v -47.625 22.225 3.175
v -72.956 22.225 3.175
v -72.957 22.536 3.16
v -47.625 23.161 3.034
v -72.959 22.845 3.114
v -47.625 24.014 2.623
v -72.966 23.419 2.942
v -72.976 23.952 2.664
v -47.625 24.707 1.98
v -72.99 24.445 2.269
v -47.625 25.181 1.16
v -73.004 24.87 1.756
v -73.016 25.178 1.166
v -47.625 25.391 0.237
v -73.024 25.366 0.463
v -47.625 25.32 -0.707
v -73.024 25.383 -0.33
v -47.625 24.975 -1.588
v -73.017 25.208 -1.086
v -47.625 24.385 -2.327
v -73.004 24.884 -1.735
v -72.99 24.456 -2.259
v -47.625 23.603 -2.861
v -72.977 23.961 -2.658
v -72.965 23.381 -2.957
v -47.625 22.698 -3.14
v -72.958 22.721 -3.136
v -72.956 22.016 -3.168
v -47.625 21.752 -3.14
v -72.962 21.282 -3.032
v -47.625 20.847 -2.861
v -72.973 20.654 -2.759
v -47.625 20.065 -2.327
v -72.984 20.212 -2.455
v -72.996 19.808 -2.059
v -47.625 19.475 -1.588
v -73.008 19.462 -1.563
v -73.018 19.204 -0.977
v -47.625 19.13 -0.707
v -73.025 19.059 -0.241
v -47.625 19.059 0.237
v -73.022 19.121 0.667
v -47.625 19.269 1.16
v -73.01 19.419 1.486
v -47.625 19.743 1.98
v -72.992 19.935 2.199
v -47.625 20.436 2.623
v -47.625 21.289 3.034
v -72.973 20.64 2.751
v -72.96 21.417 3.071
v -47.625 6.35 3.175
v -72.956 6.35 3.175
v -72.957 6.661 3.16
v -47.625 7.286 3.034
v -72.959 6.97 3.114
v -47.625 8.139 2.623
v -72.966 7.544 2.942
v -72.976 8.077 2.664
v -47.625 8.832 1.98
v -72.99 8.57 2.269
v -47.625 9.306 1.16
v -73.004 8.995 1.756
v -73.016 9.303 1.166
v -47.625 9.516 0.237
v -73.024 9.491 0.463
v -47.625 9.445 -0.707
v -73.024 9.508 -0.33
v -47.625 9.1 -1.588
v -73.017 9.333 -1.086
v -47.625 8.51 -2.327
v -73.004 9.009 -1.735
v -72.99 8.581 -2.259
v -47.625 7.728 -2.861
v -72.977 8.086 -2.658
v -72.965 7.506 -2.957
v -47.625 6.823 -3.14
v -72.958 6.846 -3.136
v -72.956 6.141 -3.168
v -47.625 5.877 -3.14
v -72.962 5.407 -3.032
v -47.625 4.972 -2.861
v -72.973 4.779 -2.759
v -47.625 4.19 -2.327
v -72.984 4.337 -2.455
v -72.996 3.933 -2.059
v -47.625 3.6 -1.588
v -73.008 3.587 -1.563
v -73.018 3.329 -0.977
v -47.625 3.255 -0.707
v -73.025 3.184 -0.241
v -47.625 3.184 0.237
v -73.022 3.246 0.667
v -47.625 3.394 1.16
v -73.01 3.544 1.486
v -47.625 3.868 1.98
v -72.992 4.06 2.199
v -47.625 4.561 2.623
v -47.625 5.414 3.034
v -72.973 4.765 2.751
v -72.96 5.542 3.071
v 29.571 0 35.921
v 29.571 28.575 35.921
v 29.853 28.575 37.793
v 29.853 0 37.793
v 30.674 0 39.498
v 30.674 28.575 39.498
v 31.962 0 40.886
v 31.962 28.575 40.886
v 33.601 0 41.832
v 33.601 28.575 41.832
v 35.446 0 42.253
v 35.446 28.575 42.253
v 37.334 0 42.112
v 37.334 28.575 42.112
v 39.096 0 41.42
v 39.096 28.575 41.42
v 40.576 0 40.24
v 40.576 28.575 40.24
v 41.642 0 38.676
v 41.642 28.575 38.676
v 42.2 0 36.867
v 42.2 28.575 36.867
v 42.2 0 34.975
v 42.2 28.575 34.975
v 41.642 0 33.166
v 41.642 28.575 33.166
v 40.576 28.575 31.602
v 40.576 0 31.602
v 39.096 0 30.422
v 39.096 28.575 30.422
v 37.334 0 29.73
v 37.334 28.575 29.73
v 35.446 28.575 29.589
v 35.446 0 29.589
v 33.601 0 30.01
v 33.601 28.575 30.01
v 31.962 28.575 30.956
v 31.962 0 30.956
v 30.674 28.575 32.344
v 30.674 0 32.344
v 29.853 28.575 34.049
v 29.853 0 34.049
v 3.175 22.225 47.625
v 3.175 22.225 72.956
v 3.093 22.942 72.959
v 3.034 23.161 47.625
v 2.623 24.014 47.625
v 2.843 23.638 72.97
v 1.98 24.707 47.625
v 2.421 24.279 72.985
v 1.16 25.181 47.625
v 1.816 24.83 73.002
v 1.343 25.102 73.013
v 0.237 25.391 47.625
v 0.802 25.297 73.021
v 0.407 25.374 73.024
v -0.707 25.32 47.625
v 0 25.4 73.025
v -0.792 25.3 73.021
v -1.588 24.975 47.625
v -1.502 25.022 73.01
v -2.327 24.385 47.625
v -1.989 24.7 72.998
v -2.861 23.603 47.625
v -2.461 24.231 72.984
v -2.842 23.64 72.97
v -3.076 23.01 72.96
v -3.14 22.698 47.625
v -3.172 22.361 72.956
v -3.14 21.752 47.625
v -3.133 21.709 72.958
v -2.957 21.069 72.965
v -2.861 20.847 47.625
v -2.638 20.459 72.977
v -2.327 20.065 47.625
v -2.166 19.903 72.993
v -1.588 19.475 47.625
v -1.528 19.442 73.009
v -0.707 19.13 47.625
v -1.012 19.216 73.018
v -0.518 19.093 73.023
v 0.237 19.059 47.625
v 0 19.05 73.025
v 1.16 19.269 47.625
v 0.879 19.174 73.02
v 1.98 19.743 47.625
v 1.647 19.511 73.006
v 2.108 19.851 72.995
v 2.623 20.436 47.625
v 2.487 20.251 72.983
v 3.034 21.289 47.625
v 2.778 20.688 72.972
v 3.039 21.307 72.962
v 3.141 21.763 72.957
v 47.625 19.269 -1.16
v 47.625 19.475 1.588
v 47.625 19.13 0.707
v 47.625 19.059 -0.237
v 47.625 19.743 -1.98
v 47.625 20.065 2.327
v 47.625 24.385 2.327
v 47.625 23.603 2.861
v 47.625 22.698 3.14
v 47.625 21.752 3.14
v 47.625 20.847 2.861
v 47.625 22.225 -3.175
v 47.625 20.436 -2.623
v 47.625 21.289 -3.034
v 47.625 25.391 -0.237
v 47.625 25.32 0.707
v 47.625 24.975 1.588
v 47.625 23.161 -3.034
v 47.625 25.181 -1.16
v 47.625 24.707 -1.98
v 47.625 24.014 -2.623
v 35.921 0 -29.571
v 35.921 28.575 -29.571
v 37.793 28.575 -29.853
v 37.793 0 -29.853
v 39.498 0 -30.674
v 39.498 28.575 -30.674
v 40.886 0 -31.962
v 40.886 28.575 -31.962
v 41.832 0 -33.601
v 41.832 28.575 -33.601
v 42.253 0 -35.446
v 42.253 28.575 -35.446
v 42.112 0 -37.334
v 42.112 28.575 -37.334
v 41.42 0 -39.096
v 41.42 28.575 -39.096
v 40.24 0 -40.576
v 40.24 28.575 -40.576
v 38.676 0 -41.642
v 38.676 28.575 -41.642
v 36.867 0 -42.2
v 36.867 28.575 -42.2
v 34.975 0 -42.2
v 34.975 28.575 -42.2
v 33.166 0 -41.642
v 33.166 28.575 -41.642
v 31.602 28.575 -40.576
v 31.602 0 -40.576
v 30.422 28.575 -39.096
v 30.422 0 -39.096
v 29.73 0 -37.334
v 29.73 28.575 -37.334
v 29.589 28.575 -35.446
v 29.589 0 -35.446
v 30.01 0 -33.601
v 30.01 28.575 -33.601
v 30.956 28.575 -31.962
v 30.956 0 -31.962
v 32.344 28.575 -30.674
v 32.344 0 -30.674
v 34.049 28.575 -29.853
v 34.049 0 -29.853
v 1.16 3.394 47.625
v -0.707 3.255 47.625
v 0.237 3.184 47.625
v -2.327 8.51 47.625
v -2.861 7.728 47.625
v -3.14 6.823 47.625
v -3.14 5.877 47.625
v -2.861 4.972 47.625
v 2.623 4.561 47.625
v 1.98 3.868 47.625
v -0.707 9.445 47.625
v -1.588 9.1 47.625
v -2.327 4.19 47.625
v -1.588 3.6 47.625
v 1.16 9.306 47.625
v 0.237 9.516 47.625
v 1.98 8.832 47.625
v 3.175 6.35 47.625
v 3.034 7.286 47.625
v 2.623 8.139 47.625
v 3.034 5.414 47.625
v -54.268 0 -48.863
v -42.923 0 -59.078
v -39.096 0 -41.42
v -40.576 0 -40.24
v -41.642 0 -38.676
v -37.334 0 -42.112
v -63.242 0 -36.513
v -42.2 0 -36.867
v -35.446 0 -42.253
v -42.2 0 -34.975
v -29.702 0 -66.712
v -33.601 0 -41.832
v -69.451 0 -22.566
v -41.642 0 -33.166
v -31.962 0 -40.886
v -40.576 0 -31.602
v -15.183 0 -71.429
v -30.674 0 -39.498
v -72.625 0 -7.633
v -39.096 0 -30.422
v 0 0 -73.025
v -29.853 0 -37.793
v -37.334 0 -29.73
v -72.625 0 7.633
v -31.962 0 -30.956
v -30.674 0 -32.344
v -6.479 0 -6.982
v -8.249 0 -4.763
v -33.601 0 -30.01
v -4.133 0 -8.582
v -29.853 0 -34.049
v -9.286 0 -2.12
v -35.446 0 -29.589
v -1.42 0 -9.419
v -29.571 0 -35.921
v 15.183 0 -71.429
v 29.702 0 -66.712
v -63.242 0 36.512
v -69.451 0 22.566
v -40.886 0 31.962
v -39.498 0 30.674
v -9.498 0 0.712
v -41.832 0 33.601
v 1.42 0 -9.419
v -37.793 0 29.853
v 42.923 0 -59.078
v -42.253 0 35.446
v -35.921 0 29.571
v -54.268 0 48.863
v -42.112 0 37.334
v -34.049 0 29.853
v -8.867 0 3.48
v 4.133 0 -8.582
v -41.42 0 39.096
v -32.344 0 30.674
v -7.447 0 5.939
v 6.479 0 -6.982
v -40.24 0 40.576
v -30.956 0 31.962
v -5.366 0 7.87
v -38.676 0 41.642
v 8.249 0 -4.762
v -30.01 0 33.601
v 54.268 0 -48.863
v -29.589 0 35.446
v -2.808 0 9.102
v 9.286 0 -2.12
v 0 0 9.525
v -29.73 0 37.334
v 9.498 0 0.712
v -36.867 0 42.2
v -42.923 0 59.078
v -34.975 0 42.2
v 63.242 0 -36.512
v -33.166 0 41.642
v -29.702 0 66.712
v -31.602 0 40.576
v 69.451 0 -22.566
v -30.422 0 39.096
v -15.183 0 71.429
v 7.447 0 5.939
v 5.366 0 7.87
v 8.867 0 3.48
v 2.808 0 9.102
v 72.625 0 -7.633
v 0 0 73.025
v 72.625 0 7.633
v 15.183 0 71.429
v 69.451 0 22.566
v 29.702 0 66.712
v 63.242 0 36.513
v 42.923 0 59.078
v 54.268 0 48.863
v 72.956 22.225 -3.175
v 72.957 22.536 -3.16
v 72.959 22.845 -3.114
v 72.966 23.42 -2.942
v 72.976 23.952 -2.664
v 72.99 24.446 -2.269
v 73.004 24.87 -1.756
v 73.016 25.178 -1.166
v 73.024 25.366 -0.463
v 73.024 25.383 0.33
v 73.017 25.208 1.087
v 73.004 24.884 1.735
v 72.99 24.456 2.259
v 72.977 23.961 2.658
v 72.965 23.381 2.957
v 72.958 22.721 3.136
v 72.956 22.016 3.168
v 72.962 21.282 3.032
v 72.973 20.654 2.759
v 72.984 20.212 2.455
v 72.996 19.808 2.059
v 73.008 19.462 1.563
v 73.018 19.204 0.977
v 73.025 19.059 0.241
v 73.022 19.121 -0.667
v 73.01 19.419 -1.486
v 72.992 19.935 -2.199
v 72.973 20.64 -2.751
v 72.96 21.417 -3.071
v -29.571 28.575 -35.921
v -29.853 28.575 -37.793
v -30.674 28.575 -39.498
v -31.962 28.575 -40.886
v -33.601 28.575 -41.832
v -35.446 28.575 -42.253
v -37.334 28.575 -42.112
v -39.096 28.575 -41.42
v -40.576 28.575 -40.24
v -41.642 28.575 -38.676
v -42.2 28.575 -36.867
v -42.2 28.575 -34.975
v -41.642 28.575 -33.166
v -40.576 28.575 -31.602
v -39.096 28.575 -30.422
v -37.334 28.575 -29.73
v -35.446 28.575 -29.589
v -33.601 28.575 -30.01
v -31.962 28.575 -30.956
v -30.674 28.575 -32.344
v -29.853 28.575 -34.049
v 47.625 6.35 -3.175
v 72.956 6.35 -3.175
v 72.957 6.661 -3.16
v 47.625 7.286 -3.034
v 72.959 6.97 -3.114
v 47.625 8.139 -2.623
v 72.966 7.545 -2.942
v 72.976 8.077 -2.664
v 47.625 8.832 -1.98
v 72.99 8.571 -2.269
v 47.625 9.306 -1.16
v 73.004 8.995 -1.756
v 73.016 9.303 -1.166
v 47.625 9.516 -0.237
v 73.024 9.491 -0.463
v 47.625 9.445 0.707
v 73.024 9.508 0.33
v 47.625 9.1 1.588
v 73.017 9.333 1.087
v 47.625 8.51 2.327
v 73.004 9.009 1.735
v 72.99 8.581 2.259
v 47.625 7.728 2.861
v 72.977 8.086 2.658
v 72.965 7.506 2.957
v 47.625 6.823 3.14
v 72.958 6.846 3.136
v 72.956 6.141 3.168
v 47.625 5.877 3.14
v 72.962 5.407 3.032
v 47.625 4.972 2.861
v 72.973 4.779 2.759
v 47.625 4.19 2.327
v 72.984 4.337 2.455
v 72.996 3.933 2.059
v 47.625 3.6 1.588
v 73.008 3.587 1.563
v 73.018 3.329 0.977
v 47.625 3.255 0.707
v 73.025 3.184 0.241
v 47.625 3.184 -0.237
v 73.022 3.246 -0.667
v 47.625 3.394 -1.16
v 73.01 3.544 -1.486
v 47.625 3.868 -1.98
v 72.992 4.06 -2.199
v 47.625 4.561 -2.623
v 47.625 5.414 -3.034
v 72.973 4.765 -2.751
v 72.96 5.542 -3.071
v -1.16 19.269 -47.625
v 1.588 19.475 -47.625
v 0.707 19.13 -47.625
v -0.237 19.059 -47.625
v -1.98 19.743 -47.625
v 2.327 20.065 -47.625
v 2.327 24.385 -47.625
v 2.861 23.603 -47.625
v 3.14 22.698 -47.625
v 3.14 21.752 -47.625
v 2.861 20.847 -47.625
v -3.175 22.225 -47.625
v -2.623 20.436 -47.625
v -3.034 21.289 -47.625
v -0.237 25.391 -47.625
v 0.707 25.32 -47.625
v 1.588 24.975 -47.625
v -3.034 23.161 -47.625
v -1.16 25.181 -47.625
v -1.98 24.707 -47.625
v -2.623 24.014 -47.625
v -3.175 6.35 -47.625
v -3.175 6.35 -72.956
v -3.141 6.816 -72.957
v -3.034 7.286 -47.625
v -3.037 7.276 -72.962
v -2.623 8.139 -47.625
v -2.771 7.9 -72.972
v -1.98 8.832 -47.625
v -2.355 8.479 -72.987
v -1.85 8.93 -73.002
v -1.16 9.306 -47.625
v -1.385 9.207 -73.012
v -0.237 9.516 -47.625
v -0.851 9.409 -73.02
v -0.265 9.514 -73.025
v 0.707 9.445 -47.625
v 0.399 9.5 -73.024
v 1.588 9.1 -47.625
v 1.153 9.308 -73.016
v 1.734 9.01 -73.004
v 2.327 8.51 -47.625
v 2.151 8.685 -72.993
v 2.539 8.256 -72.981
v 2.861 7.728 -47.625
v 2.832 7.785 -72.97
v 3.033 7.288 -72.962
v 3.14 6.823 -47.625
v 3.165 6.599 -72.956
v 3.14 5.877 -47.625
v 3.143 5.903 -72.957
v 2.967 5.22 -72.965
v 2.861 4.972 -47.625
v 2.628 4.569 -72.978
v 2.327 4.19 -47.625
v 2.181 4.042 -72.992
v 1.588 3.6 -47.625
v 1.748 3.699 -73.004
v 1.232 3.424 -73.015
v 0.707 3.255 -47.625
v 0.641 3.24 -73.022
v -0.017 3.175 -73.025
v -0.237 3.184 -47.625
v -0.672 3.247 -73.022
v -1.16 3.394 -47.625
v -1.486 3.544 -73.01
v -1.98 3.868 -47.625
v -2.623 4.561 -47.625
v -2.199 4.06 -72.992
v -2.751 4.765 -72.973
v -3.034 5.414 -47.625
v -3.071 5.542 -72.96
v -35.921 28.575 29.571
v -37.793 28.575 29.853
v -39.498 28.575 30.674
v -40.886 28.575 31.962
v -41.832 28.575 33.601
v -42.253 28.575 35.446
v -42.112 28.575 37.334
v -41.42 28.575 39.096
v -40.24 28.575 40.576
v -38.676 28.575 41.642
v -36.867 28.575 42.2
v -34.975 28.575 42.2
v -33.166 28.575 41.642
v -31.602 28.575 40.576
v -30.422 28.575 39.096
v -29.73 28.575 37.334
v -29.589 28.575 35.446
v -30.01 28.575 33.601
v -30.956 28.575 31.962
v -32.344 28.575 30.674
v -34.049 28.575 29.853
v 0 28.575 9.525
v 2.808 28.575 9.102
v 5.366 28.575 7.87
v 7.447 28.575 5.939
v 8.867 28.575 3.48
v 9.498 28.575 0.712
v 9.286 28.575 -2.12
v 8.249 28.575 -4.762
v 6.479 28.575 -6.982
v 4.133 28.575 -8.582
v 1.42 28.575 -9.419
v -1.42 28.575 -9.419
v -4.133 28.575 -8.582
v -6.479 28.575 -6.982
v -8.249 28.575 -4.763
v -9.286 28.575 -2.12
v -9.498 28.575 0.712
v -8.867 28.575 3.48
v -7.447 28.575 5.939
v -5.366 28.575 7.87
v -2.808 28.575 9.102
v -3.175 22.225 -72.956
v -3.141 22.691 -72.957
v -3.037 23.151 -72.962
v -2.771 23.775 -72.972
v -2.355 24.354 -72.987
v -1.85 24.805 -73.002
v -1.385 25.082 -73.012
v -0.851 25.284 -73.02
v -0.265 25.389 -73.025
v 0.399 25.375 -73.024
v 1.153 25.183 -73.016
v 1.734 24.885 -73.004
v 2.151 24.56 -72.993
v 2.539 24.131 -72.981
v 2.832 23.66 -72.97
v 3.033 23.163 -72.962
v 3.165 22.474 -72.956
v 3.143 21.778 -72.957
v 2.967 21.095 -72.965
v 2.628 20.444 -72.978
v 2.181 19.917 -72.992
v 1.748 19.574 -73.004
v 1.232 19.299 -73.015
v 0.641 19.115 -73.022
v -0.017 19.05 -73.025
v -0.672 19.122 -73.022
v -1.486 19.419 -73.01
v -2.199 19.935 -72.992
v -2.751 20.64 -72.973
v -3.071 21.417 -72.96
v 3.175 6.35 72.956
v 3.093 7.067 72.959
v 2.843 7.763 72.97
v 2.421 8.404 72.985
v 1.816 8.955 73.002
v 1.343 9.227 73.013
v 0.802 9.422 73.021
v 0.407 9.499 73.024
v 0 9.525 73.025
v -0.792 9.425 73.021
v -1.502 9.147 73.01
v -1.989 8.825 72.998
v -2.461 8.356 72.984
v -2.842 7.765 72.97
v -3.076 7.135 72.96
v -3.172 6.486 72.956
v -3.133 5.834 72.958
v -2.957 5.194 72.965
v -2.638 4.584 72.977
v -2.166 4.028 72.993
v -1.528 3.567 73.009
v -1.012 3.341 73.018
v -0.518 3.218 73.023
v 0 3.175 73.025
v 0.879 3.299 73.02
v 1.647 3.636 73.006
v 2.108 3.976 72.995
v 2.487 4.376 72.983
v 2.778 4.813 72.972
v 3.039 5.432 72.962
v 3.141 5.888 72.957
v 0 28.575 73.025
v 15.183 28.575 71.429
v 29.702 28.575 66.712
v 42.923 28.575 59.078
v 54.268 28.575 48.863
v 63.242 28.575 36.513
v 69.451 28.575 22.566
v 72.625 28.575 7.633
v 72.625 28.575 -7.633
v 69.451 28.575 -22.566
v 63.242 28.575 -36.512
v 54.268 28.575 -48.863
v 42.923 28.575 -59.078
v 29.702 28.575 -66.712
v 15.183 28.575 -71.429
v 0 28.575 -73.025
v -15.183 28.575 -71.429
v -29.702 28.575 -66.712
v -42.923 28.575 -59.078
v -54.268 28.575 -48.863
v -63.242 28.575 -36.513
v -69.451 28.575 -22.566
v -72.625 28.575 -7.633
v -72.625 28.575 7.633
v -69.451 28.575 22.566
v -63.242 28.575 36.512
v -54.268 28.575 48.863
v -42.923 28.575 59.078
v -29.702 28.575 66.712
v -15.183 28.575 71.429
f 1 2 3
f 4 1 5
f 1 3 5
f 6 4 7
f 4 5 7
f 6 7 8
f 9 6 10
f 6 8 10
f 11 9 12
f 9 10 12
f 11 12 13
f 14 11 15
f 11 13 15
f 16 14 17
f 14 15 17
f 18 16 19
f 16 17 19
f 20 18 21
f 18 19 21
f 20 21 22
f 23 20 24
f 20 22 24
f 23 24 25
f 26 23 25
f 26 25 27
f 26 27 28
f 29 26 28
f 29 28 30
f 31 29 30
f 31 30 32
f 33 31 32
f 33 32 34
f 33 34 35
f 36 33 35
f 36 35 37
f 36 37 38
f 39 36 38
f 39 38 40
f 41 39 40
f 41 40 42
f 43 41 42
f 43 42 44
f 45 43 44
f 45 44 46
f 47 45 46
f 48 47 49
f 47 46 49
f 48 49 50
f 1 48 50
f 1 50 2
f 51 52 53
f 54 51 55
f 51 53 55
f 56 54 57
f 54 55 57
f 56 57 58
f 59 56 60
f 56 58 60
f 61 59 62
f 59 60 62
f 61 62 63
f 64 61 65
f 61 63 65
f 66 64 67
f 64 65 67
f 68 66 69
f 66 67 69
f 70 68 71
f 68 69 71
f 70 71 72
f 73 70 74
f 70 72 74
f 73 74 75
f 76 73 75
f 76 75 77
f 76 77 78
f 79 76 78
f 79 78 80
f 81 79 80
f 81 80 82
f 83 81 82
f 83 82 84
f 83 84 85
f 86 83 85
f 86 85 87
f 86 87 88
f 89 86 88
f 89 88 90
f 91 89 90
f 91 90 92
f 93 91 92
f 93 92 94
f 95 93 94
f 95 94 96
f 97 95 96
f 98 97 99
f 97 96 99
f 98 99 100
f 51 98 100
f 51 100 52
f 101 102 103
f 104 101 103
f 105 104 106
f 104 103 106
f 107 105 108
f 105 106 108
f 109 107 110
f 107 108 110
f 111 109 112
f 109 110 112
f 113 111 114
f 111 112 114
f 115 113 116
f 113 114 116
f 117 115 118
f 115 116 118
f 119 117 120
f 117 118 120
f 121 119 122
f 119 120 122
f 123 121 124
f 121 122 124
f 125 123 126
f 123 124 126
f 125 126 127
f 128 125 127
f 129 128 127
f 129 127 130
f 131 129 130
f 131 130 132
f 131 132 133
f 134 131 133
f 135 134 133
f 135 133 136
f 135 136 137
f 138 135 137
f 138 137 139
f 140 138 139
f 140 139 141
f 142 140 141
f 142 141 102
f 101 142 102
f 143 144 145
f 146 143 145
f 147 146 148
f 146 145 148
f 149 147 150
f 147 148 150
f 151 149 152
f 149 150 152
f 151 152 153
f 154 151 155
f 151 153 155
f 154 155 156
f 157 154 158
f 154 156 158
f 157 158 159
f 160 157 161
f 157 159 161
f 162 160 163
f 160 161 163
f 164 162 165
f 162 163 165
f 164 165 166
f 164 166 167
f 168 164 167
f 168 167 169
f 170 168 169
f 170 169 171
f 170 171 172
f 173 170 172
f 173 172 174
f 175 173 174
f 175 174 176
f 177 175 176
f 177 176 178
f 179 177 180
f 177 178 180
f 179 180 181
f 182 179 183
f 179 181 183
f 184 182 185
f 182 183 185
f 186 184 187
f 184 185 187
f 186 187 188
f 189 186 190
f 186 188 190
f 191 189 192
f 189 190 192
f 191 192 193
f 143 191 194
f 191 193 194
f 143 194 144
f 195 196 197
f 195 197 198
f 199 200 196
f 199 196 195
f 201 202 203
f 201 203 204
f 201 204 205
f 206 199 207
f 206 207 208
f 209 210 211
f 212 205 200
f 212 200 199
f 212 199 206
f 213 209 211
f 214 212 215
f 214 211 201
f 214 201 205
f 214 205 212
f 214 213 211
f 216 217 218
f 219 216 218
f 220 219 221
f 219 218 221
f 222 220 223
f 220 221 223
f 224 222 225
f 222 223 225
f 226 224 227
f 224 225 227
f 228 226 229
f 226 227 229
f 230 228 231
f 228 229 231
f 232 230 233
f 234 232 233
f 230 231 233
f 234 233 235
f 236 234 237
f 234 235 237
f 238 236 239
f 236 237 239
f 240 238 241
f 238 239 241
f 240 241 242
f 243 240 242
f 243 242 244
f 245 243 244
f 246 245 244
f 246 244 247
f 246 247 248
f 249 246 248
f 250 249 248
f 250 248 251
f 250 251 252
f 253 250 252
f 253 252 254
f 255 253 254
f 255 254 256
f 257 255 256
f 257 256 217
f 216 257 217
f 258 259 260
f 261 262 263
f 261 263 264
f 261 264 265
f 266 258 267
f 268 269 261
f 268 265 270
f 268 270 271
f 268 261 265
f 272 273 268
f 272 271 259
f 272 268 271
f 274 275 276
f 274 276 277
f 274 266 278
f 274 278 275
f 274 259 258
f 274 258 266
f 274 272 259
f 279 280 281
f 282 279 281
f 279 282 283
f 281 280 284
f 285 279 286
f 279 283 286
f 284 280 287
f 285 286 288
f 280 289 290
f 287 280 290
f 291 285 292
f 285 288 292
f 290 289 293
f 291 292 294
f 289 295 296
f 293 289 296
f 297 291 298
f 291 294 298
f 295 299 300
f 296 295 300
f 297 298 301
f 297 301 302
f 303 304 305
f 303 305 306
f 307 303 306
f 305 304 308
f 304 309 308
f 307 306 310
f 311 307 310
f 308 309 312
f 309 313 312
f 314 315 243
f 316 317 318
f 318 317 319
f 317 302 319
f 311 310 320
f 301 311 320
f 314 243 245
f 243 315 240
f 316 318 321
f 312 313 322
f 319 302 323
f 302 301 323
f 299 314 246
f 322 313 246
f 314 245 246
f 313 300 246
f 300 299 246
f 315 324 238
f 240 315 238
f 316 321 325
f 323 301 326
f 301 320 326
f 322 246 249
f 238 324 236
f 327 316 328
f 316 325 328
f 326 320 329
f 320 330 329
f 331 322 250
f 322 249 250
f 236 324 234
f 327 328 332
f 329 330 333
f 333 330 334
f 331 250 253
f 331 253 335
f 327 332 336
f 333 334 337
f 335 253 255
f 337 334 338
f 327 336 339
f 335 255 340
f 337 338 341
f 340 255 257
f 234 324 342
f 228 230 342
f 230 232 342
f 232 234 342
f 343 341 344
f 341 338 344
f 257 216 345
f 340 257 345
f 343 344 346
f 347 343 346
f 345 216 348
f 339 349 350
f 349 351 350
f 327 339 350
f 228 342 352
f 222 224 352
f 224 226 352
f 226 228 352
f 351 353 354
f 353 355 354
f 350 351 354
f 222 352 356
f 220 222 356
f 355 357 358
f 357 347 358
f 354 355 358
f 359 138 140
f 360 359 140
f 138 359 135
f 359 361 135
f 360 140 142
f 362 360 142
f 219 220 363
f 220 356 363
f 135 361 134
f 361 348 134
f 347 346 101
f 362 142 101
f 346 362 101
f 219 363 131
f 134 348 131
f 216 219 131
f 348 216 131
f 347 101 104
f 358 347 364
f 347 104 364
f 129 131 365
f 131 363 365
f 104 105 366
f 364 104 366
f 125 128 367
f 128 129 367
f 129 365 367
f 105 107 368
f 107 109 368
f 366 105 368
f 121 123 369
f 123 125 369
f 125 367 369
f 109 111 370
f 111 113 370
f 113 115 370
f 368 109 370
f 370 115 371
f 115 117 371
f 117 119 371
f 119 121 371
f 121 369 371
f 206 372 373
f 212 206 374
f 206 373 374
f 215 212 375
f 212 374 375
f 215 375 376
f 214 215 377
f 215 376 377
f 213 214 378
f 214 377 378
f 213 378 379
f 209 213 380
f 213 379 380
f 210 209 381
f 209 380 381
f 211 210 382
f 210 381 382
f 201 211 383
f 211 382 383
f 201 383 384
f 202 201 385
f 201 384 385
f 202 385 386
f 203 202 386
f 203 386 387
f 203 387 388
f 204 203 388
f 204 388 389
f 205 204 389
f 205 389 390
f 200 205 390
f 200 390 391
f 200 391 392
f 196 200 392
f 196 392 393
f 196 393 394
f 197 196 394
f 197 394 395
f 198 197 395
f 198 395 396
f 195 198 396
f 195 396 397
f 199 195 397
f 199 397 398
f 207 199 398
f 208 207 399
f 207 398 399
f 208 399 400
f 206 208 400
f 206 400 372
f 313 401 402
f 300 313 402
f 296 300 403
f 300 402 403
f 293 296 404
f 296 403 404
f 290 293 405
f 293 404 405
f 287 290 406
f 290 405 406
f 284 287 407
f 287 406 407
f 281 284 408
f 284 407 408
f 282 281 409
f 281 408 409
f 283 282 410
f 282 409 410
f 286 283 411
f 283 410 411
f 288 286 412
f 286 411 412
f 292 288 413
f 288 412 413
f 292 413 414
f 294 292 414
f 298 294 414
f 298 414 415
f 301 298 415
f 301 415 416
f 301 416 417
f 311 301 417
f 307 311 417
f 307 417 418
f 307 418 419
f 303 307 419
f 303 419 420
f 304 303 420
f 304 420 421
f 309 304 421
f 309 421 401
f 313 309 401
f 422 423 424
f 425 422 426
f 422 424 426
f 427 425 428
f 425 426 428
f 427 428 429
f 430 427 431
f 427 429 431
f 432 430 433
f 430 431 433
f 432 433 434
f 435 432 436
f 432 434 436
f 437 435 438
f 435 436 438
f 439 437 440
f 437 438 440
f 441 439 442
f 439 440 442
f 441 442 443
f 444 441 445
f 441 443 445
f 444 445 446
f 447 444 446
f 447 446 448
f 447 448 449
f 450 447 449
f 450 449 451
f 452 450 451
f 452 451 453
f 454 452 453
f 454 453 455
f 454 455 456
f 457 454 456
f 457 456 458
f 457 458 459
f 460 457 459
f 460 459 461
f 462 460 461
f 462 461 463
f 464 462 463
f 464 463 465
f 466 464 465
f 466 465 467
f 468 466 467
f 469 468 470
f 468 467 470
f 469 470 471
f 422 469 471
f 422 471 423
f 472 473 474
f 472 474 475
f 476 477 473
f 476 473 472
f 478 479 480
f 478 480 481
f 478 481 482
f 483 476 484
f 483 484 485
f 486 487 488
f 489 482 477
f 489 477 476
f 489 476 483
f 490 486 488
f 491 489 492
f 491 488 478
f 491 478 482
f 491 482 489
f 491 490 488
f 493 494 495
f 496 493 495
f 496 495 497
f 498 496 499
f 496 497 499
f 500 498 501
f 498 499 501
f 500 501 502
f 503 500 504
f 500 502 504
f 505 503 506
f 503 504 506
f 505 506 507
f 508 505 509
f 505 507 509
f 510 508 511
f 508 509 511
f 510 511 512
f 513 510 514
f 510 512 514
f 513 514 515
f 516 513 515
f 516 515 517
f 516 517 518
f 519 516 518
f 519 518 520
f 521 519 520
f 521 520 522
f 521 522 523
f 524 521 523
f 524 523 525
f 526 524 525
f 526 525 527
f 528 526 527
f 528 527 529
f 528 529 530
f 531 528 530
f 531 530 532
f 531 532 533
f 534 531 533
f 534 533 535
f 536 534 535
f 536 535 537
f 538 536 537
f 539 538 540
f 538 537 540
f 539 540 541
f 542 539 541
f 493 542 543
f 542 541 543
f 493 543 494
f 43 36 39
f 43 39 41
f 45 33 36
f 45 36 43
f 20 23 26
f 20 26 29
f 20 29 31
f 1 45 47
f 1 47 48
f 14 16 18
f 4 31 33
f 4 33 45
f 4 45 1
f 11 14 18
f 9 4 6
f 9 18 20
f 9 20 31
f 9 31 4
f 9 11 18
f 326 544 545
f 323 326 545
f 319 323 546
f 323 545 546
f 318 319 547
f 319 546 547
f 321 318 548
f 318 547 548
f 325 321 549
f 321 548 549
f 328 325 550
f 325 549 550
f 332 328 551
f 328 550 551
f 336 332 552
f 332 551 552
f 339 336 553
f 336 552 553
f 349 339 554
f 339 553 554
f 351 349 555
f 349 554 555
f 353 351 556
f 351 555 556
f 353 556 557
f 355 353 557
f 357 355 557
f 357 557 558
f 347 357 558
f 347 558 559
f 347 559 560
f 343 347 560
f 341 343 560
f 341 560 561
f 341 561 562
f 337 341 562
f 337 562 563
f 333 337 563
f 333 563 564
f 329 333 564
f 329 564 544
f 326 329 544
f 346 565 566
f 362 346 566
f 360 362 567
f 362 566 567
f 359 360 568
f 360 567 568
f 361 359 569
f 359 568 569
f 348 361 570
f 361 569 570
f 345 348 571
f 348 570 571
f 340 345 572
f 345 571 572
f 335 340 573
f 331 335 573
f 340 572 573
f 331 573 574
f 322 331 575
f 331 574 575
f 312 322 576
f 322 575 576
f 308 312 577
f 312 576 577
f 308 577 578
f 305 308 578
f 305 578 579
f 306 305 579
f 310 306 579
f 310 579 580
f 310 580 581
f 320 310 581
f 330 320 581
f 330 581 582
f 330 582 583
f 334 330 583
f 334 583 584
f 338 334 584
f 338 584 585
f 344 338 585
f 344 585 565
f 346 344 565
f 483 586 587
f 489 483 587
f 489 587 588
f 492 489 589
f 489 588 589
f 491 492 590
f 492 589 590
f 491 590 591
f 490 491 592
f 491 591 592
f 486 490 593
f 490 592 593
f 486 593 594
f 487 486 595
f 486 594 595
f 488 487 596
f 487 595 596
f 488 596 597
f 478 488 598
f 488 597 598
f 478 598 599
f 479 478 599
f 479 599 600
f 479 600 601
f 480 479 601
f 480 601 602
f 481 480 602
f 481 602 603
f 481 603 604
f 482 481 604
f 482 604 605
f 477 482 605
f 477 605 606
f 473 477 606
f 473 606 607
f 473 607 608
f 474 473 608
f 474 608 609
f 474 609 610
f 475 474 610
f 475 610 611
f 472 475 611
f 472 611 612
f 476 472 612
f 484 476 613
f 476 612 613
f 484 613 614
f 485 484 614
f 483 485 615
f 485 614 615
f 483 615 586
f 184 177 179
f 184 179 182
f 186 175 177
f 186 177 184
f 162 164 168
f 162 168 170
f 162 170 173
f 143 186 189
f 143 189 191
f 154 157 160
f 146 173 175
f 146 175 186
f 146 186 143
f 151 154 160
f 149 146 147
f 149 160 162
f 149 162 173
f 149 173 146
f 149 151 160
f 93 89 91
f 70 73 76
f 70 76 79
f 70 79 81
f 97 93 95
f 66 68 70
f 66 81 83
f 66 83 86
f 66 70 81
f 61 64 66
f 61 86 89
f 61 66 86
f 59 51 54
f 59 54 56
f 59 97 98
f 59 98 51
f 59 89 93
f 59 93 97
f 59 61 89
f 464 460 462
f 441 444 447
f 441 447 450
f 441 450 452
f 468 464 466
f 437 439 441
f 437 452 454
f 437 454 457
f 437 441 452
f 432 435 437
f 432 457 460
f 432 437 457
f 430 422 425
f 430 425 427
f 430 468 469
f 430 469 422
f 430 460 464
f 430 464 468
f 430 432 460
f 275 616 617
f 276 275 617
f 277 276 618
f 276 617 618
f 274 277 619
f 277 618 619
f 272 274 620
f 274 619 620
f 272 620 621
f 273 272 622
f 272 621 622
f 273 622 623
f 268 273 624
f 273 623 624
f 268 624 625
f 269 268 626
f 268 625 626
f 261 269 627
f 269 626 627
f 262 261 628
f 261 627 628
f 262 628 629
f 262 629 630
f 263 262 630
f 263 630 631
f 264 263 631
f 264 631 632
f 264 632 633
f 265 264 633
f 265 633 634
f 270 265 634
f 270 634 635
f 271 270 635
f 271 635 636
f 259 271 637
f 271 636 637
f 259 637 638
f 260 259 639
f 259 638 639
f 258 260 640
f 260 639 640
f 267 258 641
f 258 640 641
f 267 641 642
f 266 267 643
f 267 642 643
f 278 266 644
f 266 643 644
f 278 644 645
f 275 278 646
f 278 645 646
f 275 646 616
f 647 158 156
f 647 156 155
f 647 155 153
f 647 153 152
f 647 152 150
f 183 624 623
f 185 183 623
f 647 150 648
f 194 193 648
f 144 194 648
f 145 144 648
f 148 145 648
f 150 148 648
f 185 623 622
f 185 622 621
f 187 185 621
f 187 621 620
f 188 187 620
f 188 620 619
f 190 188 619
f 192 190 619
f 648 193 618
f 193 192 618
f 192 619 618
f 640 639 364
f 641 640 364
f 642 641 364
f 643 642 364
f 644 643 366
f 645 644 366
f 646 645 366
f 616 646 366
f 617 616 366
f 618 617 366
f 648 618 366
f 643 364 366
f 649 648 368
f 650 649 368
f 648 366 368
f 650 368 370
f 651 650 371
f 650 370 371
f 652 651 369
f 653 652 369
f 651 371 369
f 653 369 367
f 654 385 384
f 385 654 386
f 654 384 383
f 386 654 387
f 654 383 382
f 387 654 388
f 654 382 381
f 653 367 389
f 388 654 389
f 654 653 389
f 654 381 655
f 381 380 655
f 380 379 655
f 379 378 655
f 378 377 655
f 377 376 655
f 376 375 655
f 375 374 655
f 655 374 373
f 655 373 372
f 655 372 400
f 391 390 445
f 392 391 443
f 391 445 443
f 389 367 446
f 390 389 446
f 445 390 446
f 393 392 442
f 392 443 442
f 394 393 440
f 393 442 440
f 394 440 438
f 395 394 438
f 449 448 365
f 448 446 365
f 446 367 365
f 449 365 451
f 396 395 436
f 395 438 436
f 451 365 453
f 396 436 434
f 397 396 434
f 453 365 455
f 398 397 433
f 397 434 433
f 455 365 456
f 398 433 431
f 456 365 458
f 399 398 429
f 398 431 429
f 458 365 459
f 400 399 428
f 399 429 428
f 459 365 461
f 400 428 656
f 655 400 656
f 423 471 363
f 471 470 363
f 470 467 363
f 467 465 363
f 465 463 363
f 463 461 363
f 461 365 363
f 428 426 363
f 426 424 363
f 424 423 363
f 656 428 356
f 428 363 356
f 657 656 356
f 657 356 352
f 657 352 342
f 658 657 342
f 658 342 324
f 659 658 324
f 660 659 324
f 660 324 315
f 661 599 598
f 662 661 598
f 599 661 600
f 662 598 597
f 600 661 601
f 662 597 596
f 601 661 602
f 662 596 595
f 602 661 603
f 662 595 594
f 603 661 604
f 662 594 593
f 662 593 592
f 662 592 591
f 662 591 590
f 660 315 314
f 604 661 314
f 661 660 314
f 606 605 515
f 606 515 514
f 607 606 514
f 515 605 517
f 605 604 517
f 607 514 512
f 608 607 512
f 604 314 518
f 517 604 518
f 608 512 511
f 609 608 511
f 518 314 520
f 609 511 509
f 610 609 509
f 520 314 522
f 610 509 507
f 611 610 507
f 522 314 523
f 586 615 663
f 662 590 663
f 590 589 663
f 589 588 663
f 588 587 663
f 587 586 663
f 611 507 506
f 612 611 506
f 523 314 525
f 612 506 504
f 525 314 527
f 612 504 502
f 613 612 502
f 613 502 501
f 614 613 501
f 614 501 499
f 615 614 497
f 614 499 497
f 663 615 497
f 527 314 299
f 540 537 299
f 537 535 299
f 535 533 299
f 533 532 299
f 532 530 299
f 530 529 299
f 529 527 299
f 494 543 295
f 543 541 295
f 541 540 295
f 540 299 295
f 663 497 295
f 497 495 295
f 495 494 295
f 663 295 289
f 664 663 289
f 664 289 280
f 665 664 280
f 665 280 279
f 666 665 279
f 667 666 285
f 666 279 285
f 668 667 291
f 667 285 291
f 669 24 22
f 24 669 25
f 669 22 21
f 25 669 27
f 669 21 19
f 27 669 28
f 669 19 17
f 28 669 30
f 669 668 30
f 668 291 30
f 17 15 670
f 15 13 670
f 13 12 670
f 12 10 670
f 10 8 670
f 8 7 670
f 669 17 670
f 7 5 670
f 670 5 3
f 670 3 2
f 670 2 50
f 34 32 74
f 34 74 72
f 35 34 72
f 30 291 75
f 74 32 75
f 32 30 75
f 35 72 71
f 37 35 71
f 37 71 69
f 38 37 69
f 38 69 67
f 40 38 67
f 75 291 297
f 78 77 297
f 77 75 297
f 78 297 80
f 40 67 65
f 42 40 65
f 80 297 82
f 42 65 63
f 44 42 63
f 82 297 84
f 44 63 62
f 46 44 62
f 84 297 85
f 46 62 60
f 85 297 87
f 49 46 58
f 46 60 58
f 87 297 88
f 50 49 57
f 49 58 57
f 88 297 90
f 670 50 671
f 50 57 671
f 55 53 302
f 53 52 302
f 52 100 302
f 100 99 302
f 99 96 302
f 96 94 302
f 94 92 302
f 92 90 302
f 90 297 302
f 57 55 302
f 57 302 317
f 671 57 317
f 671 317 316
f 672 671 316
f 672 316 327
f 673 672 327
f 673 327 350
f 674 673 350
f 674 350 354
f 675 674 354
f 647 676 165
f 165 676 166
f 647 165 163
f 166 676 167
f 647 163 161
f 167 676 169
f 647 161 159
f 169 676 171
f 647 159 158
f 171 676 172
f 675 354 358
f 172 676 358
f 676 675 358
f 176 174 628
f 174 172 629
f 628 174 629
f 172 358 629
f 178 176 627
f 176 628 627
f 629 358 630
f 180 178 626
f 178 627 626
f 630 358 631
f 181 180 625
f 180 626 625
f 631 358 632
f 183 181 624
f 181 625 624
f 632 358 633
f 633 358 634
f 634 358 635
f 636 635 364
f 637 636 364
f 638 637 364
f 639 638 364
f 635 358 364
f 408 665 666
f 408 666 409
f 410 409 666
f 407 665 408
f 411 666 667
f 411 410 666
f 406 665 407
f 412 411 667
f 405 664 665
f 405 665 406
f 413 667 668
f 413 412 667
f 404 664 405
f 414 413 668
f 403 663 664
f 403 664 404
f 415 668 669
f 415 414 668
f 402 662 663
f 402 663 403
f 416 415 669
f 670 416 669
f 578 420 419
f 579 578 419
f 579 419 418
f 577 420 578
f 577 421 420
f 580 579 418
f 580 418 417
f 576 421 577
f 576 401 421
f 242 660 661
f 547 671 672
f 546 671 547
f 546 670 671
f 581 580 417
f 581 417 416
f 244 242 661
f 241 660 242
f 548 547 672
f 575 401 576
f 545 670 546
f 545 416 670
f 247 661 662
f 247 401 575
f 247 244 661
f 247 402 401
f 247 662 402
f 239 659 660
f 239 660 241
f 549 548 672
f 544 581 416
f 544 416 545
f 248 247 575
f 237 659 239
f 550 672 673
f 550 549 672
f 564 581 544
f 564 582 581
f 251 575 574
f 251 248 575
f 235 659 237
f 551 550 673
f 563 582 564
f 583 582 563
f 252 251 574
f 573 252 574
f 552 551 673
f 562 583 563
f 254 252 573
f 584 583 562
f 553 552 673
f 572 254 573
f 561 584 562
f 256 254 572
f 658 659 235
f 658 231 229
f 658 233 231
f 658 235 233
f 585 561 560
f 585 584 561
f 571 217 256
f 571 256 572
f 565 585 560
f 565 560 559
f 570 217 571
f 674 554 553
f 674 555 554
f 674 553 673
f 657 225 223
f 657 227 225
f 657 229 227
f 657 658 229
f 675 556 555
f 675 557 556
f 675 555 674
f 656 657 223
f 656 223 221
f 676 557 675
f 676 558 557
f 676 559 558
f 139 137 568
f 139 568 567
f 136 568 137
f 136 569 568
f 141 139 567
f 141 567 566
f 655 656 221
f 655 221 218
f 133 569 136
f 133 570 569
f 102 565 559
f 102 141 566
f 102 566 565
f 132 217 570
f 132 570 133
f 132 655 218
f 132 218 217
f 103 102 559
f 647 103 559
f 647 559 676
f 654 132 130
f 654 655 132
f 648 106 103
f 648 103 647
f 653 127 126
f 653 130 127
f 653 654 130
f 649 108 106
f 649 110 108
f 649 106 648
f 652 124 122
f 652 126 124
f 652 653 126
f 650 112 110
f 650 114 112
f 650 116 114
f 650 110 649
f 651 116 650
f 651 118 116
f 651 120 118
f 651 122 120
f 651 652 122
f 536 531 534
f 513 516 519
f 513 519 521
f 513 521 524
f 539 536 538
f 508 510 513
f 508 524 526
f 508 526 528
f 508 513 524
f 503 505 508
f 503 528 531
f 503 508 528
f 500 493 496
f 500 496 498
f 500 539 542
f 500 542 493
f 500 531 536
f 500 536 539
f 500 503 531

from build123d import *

# Parameters (mm, degrees)
SKETCH1_R           = 73.025
BOSS_EXTRUDE1_DEPTH = 28.575
SKETCH2_R           = 9.525
CUT_EXTRUDE1_DEPTH  = 108.153310145
SKETCH30_R          = 3.175
CUT_EXTRUDE2_DEPTH  = 25.4
CIRPATTERN3_COUNT   = 4
SKETCH31_R          = 6.35
CUT_EXTRUDE3_DEPTH  = 108.153310308
CIRPATTERN4_COUNT   = 4


with BuildPart() as part:
    # Sketch1 → Boss-Extrude1 (new body)
    with BuildSketch(Plane(origin=(0, 0, 0), x_dir=(1, 0, 0), z_dir=(0, 1, 0))):
        with Locations(Location((0, 0, 0), (0, 0, 270))):
            Circle(SKETCH1_R)
    extrude(amount=BOSS_EXTRUDE1_DEPTH)

    # Sketch2 → Cut-Extrude1 (cut, through all)
    with BuildSketch(Plane(origin=(0, 28.575, 0), x_dir=(1, 0, 0), z_dir=(0, 1, 0))):
        with Locations(Location((0, 0, 0), (0, 0, 270))):
            Circle(SKETCH2_R)
    extrude(amount=-CUT_EXTRUDE1_DEPTH, mode=Mode.SUBTRACT)

    # Sketch30 → Cut-Extrude2 (cut)
    with BuildSketch(Plane.XY.offset(73.025)):
        with Locations((0, 22.225)):
            Circle(SKETCH30_R)
        with Locations((0, 6.35)):
            Circle(SKETCH30_R)
    cut_extrude2 = extrude(amount=-CUT_EXTRUDE2_DEPTH, mode=Mode.SUBTRACT)

    # CirPattern3: Cut-Extrude2 ×4 about axis
    cirpattern3_axis = Axis((0, 0, 0), (0, 1, 0))
    for i in range(1, CIRPATTERN3_COUNT):
        add(cut_extrude2.rotate(cirpattern3_axis, i * 360 / CIRPATTERN3_COUNT), mode=Mode.SUBTRACT)

    # Sketch31 → Cut-Extrude3 (cut, through all)
    with BuildSketch(Plane(origin=(0, 28.575, 0), x_dir=(1, 0, 0), z_dir=(0, 1, 0))):
        with Locations(Location((35.921024484, 35.921024484, 0), (0, 0, 270))):
            Circle(SKETCH31_R)
    cut_extrude3 = extrude(amount=-CUT_EXTRUDE3_DEPTH, mode=Mode.SUBTRACT)

    # CirPattern4: Cut-Extrude3 ×4 about axis
    cirpattern4_axis = Axis((0, 0, 0), (0, 1, 0))
    for i in range(1, CIRPATTERN4_COUNT):
        add(cut_extrude3.rotate(cirpattern4_axis, i * 360 / CIRPATTERN4_COUNT), mode=Mode.SUBTRACT)


solid = part.part
